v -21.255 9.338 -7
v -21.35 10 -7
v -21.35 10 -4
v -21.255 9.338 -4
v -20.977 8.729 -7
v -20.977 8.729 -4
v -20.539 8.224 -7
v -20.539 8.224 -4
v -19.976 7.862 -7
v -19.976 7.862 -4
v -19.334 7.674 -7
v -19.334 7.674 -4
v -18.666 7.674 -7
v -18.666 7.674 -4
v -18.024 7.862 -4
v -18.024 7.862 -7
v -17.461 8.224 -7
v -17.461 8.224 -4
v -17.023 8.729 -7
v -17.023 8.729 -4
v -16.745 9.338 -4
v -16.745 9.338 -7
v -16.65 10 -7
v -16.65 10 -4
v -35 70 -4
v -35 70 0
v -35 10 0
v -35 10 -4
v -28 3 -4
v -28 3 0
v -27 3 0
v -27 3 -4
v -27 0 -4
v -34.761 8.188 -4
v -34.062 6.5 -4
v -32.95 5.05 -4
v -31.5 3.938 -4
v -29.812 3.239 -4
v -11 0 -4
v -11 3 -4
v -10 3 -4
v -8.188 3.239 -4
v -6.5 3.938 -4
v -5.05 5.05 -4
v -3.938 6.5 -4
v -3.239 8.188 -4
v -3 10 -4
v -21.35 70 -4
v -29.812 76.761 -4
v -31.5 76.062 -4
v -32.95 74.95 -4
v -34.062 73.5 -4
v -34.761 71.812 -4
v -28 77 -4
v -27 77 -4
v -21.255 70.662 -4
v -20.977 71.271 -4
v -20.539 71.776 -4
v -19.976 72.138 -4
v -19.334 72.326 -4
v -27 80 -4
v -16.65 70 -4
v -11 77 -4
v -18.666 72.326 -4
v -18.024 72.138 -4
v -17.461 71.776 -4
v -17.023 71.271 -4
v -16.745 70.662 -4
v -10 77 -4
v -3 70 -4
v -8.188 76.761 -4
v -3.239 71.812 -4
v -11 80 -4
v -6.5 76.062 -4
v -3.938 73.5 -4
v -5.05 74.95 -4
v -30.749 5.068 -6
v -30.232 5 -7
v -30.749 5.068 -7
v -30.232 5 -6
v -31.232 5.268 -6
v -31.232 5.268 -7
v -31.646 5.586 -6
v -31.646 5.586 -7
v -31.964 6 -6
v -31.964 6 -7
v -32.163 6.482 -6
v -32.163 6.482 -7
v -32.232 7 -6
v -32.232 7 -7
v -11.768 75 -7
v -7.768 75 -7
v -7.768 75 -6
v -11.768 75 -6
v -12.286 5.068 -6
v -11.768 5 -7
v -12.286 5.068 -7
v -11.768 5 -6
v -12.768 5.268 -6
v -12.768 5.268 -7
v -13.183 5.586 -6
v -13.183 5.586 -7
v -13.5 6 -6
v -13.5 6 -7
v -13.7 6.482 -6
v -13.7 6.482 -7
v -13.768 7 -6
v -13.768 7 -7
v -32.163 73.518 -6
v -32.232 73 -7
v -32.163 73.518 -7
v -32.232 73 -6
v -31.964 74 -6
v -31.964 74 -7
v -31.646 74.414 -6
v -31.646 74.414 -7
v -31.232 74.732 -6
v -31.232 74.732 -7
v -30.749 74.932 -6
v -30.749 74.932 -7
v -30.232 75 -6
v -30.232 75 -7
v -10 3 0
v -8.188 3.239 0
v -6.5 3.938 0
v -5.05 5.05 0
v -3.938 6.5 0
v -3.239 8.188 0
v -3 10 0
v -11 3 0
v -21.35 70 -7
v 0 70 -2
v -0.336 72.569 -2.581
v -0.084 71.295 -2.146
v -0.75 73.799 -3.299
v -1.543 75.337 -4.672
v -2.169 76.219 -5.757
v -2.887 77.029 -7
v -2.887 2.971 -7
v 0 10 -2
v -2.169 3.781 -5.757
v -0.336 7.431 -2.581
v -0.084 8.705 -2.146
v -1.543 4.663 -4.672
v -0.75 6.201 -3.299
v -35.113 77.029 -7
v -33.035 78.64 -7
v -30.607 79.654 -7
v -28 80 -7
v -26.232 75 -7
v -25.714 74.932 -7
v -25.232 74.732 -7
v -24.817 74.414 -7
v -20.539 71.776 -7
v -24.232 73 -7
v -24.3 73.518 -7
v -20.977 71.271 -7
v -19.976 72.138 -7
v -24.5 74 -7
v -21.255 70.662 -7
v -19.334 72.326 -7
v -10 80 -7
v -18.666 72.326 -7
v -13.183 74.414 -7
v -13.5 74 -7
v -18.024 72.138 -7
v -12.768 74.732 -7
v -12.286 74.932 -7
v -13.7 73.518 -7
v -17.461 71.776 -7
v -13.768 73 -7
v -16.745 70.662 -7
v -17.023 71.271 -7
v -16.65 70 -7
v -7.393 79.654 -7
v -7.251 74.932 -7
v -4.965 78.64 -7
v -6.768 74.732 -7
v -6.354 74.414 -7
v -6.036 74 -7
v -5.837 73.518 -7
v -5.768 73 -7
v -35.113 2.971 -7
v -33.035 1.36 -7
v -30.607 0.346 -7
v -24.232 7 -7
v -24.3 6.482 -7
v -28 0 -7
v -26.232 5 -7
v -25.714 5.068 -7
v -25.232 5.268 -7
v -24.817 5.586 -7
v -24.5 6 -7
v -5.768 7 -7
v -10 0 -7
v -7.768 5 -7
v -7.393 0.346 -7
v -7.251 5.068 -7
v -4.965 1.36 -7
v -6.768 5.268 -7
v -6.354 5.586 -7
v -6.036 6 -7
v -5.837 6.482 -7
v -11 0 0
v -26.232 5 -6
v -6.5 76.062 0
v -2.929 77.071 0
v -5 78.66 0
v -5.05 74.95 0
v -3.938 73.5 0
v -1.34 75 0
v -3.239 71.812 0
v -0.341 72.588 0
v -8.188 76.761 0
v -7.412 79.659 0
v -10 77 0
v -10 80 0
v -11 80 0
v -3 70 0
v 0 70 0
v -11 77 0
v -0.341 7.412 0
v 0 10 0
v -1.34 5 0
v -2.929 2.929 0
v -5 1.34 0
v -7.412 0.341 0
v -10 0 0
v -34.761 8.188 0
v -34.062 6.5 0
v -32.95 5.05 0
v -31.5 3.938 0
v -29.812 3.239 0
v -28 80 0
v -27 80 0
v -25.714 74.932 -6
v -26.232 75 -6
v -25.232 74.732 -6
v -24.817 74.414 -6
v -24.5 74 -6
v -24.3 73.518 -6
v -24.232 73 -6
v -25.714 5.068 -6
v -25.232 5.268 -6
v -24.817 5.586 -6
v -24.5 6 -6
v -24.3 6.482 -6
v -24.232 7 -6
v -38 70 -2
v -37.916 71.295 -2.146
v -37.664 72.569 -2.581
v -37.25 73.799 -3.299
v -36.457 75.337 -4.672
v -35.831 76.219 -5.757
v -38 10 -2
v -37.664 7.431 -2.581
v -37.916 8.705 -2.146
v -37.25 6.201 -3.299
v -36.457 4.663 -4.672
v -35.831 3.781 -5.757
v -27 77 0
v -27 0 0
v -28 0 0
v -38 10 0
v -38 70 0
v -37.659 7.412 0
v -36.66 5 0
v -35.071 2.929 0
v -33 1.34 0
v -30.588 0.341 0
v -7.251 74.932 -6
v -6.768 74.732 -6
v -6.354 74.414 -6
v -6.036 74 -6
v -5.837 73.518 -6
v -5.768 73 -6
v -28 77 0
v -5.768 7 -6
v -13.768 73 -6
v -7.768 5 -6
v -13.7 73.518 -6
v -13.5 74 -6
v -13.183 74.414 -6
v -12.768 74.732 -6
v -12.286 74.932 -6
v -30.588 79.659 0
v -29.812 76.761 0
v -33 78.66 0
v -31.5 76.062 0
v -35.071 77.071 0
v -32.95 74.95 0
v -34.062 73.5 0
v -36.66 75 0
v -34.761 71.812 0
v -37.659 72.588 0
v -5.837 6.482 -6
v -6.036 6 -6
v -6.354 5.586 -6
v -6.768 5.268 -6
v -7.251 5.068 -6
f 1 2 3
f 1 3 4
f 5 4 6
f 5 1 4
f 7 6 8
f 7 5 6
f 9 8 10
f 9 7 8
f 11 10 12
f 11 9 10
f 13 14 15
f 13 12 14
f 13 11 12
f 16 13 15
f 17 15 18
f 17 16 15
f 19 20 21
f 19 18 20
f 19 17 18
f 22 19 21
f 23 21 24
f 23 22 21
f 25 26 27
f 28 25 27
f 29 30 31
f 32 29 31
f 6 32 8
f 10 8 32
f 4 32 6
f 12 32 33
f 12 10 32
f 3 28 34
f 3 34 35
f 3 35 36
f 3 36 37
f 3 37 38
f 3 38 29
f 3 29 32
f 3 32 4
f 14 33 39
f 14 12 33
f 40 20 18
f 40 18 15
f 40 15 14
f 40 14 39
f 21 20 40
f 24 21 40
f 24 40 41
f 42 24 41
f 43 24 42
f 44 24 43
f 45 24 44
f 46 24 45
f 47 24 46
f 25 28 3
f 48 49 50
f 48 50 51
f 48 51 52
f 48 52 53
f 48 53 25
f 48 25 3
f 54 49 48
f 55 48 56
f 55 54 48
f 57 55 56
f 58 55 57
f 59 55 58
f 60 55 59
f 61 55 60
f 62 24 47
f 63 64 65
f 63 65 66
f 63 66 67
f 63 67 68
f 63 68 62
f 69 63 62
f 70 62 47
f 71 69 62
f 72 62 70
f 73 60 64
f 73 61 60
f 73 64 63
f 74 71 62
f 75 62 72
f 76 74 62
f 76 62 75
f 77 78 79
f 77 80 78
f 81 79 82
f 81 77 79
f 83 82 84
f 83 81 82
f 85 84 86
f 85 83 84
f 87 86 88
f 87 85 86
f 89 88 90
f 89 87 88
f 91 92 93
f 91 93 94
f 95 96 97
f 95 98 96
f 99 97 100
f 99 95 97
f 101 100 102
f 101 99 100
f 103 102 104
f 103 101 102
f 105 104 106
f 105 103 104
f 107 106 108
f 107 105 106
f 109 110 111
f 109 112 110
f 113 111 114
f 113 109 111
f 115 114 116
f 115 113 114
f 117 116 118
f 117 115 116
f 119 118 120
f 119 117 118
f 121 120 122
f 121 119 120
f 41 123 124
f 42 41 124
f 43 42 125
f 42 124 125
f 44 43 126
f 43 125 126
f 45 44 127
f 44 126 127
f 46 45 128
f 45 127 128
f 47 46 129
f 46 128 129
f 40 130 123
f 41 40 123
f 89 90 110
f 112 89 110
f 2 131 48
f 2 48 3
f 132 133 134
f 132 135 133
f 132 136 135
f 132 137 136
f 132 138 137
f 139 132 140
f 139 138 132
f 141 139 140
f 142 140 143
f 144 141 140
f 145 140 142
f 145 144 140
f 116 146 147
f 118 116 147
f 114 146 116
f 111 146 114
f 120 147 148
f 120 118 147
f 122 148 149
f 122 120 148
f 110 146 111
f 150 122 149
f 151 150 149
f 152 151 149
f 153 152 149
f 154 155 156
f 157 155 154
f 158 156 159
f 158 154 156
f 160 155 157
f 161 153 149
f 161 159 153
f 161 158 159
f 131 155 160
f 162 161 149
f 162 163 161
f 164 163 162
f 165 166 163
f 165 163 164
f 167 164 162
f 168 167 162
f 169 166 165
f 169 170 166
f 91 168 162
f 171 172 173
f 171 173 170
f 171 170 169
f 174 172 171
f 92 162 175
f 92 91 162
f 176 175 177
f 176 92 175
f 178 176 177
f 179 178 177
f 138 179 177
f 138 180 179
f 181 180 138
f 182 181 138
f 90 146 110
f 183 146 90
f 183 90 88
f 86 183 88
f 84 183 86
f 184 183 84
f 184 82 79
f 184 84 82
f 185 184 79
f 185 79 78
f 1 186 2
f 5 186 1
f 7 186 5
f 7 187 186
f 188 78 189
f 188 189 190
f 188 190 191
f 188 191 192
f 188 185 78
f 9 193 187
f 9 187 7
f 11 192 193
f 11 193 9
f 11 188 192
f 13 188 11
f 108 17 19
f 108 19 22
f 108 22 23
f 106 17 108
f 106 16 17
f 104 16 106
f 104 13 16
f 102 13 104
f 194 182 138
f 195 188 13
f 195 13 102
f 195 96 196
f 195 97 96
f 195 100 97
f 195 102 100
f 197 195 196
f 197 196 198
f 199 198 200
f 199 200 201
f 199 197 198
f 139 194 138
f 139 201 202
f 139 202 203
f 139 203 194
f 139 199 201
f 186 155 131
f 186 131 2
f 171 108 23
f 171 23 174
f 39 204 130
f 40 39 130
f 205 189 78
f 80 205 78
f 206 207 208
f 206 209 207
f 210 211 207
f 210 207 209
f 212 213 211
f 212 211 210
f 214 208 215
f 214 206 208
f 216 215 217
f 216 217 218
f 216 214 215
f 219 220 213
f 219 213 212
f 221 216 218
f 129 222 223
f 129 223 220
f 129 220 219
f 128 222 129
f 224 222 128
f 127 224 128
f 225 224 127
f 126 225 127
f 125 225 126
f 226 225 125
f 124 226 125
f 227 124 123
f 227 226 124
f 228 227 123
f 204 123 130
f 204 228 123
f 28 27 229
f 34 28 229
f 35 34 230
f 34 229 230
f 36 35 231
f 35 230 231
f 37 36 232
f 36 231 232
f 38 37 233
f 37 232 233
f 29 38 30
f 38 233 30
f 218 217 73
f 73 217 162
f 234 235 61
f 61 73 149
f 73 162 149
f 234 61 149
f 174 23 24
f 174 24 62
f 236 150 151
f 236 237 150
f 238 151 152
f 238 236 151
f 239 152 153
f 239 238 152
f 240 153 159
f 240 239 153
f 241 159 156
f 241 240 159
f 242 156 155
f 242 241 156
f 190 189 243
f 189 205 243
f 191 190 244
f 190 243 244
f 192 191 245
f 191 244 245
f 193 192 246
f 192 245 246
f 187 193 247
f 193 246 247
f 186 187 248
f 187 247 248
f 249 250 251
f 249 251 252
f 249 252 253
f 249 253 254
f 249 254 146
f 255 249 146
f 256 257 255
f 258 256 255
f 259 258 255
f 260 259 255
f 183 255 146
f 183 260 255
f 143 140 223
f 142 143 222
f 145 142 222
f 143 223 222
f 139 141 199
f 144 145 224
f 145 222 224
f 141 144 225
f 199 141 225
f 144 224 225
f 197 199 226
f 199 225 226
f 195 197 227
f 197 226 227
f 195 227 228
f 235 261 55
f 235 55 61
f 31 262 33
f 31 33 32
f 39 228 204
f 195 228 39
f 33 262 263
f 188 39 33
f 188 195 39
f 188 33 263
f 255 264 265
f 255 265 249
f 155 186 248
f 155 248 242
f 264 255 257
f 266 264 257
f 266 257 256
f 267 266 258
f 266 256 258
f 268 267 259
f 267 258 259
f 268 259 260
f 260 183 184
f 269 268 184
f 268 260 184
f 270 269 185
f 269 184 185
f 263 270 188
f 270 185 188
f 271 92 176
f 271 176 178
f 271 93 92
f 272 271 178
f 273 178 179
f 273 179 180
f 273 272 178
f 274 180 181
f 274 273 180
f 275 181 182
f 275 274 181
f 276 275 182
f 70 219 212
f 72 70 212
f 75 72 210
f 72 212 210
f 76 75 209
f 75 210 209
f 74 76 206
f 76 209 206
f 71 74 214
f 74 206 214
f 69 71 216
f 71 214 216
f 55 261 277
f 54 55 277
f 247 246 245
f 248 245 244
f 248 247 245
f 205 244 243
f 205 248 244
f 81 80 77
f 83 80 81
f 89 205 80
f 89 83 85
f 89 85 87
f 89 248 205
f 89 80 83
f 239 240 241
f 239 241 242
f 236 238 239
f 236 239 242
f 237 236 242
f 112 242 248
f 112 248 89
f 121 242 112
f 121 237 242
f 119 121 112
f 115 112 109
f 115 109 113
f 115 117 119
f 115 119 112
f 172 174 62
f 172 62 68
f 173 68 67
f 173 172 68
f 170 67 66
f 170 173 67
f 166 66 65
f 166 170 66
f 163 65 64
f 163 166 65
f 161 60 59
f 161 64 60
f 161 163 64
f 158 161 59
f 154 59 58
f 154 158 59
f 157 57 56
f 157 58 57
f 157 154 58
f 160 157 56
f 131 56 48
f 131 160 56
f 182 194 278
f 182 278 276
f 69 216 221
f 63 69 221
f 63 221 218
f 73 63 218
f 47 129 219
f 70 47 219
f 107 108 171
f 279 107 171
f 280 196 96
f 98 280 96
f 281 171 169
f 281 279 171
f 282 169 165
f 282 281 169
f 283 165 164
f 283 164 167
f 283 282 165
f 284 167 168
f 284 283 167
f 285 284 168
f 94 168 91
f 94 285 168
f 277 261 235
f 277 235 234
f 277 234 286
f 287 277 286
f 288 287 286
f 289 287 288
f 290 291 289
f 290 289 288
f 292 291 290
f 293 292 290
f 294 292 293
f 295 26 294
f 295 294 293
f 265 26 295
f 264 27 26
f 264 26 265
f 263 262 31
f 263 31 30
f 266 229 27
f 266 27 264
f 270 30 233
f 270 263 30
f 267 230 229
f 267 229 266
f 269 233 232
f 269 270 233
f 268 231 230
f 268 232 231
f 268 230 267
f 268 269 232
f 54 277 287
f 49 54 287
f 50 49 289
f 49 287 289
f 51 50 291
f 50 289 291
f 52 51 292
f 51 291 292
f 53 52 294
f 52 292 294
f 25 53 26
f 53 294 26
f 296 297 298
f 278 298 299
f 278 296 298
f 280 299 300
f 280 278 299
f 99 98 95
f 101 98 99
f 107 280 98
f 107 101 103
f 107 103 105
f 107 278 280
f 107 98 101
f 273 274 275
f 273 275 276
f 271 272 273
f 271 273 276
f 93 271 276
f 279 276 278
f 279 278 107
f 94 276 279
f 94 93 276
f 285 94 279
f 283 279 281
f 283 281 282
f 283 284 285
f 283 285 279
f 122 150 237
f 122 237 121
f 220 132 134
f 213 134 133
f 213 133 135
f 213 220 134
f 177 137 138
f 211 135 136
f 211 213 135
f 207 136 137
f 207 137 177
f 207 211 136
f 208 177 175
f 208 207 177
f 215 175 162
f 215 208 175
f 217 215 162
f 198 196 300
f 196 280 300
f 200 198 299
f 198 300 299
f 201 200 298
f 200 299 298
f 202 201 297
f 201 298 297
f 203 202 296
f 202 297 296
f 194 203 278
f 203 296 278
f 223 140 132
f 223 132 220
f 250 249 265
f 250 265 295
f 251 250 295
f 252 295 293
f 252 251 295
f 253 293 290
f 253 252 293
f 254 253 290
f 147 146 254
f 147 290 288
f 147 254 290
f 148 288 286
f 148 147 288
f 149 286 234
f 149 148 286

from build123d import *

# Parameters (mm, degrees)
EXTRUDE_1_DEPTH     = 80
FILLET_1_R          = 10
CUT_EXTRUDE_1_DEPTH = 4
SKETCH_3_W          = 16
SKETCH_3_H          = 3
CUT_EXTRUDE_2_DEPTH = 4
CUT_EXTRUDE_3_REACH = 90.843
SKETCH_5_W          = 8
SKETCH_5_H          = 70
CUT_EXTRUDE_4_DEPTH = 1
FILLET_2_R          = 2


with BuildPart() as part:
    # Эскиз1 → Бобышка-Вытянуть1 (new body)
    with BuildSketch(Plane(origin=(0, 0, 0), x_dir=(1, 0, 0), z_dir=(0, 1, 0))):
        Polygon((0, 0), (-38, 0), (-38, 2), (-35.113248654, 7), (-2.886751346, 7), (0, 2), align=None)
    extrude(amount=EXTRUDE_1_DEPTH)

    # Скругление1
    fillet_1_edges = [part.edges().sort_by_distance(p)[0] for p in [
        (0, 0, -1),
        (-38, 0, -1),
        (-38, 80, -1),
        (0, 80, -1),
    ]]
    fillet(fillet_1_edges, radius=FILLET_1_R)

    # Эскиз2 → Вырез-Вытянуть1 (cut)
    with BuildSketch(Plane.XY):
        with BuildLine():
            Line((-28, 3), (-10, 3))
            ThreePointArc((-10, 3), (-5.050252532, 5.050252532), (-3, 10))
            Line((-3, 10), (-3, 70))
            ThreePointArc((-3, 70), (-5.050252532, 74.949747468), (-10, 77))
            Line((-10, 77), (-28, 77))
            ThreePointArc((-28, 77), (-32.949747468, 74.949747468), (-35, 70))
            Line((-35, 70), (-35, 10))
            ThreePointArc((-35, 10), (-32.949747468, 5.050252532), (-28, 3))
        make_face()
    extrude(amount=-CUT_EXTRUDE_1_DEPTH, mode=Mode.SUBTRACT)

    # Эскиз3 → Вырез-Вытянуть2 (cut)
    with BuildSketch(Plane.XY):
        with Locations((-19, 78.5)):
            Rectangle(SKETCH_3_W, SKETCH_3_H)
        with Locations((-19, 1.5)):
            Rectangle(SKETCH_3_W, SKETCH_3_H)
    extrude(amount=-CUT_EXTRUDE_2_DEPTH, mode=Mode.SUBTRACT)

    # Эскиз4 → Вырез-Вытянуть3 (cut, up to next)
    with BuildSketch(Plane(origin=(0, 0, -7), x_dir=(-1, 0, 0), z_dir=(0, 0, -1)), mode=Mode.PRIVATE) as cut_extrude_3_sk1:
        with BuildLine():
            Line((21.35, 70), (21.35, 10))
            ThreePointArc((21.35, 10), (19, 7.65), (16.65, 10))
            Line((16.65, 10), (16.65, 70))
            ThreePointArc((16.65, 70), (19, 72.35), (21.35, 70))
        make_face()
    cut_extrude_3_tool1 = extrude(cut_extrude_3_sk1.sketch, amount=-CUT_EXTRUDE_3_REACH, mode=Mode.PRIVATE) & part.part
    add(cut_extrude_3_tool1.solids().sort_by_distance((-19, 40, -7))[0], mode=Mode.SUBTRACT)

    # Эскиз5 → Вырез-Вытянуть4 (cut)
    with BuildSketch(Plane(origin=(0, 0, -7), x_dir=(-1, 0, 0), z_dir=(0, 0, -1))):
        with Locations((9.768375673, 40)):
            Rectangle(SKETCH_5_W, SKETCH_5_H)
        with Locations((28.231624327, 40)):
            Rectangle(SKETCH_5_W, SKETCH_5_H)
    extrude(amount=-CUT_EXTRUDE_4_DEPTH, mode=Mode.SUBTRACT)

    # Скругление2
    fillet_2_edges = [part.edges().sort_by_distance(p)[0] for p in [
        (-13.768375673, 75, -6.5),
        (-13.768375673, 5, -6.5),
        (-5.768375673, 5, -6.5),
        (-5.768375673, 75, -6.5),
        (-32.231624327, 75, -6.5),
        (-32.231624327, 5, -6.5),
        (-24.231624327, 5, -6.5),
        (-24.231624327, 75, -6.5),
    ]]
    fillet(fillet_2_edges, radius=FILLET_2_R)


solid = part.part
